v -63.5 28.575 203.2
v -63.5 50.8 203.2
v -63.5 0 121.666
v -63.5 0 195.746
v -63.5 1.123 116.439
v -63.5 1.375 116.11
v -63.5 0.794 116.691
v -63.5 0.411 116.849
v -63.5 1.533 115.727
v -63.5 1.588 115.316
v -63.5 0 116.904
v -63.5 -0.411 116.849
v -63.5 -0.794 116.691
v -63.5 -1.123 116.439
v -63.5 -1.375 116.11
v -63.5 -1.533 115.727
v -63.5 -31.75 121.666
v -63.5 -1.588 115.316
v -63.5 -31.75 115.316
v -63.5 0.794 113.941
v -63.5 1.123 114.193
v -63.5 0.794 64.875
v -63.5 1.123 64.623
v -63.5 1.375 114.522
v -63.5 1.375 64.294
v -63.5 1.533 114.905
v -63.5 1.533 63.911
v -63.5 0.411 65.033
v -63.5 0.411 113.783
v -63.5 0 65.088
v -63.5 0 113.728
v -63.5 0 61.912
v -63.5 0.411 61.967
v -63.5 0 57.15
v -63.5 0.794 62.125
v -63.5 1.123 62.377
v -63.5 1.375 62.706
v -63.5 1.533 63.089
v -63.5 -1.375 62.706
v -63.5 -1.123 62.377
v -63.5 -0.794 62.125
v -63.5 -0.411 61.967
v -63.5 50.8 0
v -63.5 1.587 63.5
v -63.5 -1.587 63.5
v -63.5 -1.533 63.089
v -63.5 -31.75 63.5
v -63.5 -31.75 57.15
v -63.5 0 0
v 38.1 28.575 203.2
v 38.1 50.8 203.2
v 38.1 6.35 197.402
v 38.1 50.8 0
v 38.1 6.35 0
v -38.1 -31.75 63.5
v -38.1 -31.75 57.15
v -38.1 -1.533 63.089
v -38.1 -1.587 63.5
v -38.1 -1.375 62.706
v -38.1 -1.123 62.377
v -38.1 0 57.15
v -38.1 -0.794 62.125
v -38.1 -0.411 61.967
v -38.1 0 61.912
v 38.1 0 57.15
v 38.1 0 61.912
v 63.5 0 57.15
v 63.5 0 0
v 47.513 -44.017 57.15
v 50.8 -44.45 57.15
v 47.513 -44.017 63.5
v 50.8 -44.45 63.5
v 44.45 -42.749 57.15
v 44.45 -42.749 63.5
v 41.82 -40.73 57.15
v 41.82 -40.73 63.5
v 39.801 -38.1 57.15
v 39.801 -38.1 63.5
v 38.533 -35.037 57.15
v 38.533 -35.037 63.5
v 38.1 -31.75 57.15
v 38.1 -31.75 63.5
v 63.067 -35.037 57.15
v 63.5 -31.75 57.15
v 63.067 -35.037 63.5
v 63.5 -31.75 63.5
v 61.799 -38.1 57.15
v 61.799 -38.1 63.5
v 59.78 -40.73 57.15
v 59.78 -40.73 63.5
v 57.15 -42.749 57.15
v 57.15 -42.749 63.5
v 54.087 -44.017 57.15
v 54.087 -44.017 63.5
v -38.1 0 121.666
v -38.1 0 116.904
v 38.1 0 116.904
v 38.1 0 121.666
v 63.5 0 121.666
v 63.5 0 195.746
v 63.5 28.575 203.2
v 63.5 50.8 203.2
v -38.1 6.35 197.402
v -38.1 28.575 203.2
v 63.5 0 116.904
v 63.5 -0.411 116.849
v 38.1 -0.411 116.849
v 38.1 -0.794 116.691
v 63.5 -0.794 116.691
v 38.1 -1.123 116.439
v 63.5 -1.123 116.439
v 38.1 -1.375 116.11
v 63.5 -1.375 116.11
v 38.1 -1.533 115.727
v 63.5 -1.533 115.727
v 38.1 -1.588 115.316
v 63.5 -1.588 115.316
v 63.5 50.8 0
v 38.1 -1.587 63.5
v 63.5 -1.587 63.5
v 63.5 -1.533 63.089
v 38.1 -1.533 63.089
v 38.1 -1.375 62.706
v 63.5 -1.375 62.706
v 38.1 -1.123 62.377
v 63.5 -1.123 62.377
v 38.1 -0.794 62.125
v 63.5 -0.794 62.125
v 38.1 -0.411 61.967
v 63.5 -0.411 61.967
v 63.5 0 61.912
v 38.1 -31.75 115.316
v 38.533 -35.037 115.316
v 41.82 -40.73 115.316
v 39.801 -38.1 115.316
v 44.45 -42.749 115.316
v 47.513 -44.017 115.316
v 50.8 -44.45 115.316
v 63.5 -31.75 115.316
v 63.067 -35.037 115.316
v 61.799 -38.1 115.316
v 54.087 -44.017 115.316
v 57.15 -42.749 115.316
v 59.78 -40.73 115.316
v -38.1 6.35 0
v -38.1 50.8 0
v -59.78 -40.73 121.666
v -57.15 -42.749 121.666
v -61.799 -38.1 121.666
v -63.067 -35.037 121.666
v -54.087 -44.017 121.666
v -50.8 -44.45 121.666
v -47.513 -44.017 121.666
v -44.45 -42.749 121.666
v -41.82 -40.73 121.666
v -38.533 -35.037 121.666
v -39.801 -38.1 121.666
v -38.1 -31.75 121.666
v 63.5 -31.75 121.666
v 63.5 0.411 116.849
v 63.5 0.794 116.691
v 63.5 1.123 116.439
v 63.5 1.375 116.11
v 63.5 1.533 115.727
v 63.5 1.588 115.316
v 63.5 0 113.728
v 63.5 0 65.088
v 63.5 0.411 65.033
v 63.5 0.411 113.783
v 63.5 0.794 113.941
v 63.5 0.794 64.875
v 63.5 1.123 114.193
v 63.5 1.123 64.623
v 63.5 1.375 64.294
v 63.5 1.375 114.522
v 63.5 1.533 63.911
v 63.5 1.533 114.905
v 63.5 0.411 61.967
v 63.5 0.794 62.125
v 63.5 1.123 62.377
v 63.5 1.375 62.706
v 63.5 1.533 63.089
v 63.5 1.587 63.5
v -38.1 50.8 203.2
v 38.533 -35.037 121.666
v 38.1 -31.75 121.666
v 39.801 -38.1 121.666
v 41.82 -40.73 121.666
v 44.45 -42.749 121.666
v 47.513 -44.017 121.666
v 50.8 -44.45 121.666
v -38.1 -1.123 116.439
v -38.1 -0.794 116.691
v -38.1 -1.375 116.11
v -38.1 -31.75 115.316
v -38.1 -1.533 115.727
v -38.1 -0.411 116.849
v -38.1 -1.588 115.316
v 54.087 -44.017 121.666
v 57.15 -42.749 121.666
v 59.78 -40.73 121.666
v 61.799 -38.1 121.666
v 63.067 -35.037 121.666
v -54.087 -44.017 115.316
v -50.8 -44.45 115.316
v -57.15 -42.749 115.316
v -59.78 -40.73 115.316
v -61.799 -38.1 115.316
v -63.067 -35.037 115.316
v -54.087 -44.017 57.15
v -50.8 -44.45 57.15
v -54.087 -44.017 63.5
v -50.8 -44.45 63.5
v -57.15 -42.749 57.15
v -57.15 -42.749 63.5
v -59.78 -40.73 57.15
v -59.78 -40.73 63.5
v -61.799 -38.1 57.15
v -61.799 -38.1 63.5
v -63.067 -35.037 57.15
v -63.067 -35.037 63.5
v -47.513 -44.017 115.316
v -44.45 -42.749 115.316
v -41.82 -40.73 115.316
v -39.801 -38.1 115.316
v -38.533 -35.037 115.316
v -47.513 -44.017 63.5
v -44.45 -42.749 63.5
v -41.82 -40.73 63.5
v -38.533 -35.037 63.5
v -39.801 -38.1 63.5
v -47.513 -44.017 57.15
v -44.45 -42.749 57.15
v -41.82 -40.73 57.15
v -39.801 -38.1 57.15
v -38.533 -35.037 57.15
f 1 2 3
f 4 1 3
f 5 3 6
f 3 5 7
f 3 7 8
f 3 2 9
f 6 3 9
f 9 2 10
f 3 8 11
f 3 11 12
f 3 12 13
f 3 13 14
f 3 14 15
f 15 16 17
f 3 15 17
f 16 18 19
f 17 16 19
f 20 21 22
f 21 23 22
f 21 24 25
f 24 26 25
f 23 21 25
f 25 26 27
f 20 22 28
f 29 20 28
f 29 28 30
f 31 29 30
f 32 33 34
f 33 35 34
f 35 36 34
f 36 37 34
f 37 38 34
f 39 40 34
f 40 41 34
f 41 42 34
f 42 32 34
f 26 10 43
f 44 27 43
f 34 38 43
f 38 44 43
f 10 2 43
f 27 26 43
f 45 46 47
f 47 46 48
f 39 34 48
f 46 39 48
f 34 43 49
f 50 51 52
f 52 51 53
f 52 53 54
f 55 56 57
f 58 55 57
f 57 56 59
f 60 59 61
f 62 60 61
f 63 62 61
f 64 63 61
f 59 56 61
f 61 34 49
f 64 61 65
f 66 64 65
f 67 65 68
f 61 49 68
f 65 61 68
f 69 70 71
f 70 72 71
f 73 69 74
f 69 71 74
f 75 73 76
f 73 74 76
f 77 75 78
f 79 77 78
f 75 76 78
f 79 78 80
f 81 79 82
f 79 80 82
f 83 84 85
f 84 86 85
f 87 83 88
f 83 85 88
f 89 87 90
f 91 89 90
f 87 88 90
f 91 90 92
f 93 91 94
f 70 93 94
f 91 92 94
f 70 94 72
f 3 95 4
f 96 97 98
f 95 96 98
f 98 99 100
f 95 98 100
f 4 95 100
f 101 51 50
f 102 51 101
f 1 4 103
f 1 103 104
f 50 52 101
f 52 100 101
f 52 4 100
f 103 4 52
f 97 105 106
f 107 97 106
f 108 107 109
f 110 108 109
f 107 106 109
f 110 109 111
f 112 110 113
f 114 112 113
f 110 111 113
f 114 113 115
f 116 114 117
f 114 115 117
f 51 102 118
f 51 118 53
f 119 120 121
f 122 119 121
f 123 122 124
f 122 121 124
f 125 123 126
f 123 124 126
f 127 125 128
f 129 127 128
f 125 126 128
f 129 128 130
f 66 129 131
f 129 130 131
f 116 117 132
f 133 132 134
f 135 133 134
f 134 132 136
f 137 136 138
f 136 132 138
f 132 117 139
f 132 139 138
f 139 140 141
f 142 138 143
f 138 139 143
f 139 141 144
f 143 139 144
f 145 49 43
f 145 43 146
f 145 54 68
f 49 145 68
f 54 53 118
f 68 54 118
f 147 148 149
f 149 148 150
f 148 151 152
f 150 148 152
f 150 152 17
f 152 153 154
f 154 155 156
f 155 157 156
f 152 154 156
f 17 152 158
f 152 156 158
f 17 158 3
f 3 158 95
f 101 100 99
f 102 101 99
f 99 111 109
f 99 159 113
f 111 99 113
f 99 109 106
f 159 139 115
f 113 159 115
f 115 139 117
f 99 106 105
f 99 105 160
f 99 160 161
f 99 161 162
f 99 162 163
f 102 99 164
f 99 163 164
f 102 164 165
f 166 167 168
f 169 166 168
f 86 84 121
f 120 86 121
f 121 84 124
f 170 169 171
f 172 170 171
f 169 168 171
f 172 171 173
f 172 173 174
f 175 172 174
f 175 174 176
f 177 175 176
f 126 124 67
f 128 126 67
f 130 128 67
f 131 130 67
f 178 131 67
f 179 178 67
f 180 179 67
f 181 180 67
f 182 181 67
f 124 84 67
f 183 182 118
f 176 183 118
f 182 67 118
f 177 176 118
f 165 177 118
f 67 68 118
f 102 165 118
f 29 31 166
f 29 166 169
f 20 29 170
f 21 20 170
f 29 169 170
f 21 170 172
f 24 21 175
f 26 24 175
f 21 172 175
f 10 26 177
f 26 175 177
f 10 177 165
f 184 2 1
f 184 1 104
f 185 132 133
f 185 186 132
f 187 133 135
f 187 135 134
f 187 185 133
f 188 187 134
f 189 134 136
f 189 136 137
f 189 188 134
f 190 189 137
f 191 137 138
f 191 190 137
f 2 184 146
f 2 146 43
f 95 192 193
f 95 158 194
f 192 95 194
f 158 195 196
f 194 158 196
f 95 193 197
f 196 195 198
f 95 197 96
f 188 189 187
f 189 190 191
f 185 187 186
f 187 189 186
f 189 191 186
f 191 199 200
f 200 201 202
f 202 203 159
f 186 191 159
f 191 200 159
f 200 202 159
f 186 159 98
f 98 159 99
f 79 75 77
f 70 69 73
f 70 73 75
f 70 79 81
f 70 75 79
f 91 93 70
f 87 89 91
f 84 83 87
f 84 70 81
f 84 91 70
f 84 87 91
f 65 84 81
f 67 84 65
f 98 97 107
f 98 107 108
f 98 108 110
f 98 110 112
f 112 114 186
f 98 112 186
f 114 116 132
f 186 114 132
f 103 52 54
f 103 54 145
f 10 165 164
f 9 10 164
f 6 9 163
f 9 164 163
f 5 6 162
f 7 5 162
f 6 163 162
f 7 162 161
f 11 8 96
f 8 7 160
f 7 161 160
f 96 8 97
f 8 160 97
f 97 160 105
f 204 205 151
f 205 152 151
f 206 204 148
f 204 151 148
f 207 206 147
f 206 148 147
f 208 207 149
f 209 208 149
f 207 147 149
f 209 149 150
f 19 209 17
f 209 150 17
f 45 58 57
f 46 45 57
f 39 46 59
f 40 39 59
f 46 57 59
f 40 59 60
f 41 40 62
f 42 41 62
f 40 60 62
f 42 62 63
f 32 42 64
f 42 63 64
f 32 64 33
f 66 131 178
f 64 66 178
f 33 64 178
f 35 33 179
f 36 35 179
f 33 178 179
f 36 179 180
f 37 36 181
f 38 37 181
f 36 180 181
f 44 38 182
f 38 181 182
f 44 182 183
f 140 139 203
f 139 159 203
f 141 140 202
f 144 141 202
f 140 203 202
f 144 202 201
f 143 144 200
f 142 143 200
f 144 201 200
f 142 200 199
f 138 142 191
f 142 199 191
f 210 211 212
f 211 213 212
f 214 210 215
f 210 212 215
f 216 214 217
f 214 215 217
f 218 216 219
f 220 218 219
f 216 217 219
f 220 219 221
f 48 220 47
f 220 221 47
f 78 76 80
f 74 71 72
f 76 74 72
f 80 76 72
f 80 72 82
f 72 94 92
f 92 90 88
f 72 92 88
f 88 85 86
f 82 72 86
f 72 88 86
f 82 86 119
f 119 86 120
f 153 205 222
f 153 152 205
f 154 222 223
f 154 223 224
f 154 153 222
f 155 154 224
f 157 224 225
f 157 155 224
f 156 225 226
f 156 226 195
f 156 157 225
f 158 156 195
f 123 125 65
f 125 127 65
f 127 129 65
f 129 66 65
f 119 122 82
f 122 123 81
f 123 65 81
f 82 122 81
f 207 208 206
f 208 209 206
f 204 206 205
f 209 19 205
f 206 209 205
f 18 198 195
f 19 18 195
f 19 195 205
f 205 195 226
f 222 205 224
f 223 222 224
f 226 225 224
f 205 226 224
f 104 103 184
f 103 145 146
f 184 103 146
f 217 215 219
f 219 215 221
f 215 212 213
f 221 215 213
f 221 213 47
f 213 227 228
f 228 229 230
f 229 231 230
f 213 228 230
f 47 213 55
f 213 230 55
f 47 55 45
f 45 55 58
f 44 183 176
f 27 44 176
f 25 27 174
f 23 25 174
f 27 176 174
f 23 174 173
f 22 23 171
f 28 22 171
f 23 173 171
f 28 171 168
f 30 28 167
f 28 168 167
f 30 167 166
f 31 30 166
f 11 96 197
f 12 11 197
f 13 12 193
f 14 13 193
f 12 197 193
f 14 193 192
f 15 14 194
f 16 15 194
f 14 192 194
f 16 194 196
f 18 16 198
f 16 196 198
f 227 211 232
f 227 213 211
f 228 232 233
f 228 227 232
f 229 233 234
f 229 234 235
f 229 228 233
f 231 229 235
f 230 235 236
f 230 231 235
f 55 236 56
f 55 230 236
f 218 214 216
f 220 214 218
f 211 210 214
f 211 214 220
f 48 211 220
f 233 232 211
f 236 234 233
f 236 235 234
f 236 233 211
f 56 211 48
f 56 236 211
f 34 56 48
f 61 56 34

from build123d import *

# Parameters (mm, degrees)
F1_DEPTH = 203.2
F2_W     = 44.45
F2_H     = 57.15
F3_DEPTH = 127.001
F4_R     = 12.69999


# Not quite as in the source:
# - a fillet or chamfer is up to 0.001 mm smaller than in the source, because OpenCascade refuses the exact size
# - a feature of the source that left no trace in its solid (it failed there, or was rolled back) is left out


with BuildPart() as f1:
    # F0 (on Top) → F1 (new body)
    with BuildSketch(Plane.XY):
        Polygon((-38.1, 0), (0, 0), (38.1, 0), (38.1, -44.45), (63.5, -44.45), (63.5, 50.8), (38.1, 50.8), (38.1, 6.35), (0, 6.35), (-38.1, 6.35), (-38.1, 50.8), (-63.5, 50.8), (-63.5, -44.45), (-38.1, -44.45), align=None)
    extrude(amount=F1_DEPTH)

    # F2 (on face) → F3 (cut, through all)
    with BuildSketch(Plane.YZ.offset(63.5)):
        with BuildLine():
            Line((-44.45, 115.316), (-44.45, 63.5))
            Line((-44.45, 63.5), (-1.5875, 63.5))
            ThreePointArc((-1.5875, 63.5), (-1.1225320151, 64.6225320151), (0, 65.0875))
            Line((0, 65.0875), (0, 113.7285))
            ThreePointArc((0, 113.7285), (-1.1225320151, 114.1934679849), (-1.5875, 115.316))
            Line((-1.5875, 115.316), (-44.45, 115.316))
        make_face()
        with BuildLine():
            ThreePointArc((0, 65.0875), (-1.1225320151, 64.6225320151), (-1.5875, 63.5))
            Line((-1.5875, 63.5), (0, 63.5))
            Line((0, 63.5), (0, 65.0875))
        make_face()
        with Locations((-22.225, 28.575)):
            Rectangle(F2_W, F2_H)
        Polygon((-44.45, 203.2), (-44.45, 184.15), (0, 195.7456521739), (0, 203.2), align=None)
        with BuildLine():
            Line((0, 115.316), (0, 113.7285))
            ThreePointArc((0, 113.7285), (1.1225320151, 114.1934679849), (1.5875, 115.316))
            ThreePointArc((1.5875, 115.316), (1.1225320151, 116.4385320151), (0, 116.9035))
            Line((0, 116.9035), (0, 115.316))
        make_face()
        with BuildLine():
            ThreePointArc((0, 116.9035), (-1.1225320151, 116.4385320151), (-1.5875, 115.316))
            Line((-1.5875, 115.316), (0, 115.316))
            Line((0, 115.316), (0, 116.9035))
        make_face()
        with BuildLine():
            Line((0, 115.316), (-1.5875, 115.316))
            ThreePointArc((-1.5875, 115.316), (-1.1225320151, 114.1934679849), (0, 113.7285))
            Line((0, 113.7285), (0, 115.316))
        make_face()
        with BuildLine():
            Line((0, 65.0875), (0, 63.5))
            Line((0, 63.5), (0, 61.9125))
            ThreePointArc((0, 61.9125), (1.1225320151, 62.3774679849), (1.5875, 63.5))
            ThreePointArc((1.5875, 63.5), (1.1225320151, 64.6225320151), (0, 65.0875))
        make_face()
        with BuildLine():
            Line((0, 63.5), (-1.5875, 63.5))
            ThreePointArc((-1.5875, 63.5), (-1.1225320151, 62.3774679849), (0, 61.9125))
            Line((0, 61.9125), (0, 63.5))
        make_face()
        Polygon((0, 203.2), (0, 195.7456521739), (28.575, 203.2), align=None)
        Polygon((-44.45, 184.15), (-44.45, 121.666), (0, 121.666), (0, 195.7456521739), align=None)
    extrude(amount=-F3_DEPTH, mode=Mode.SUBTRACT)

    # F4 (radius 12.7 in the source; OpenCascade refuses exactly that, so slightly less here)
    f4_edges = [f1.edges().sort_by_distance(p)[0] for p in [
        (38.1, -44.45, 118.491),
        (63.5, -44.45, 118.491),
        (-63.5, -44.45, 118.491),
        (-38.1, -44.45, 118.491),
        (-38.1, -44.45, 60.325),
        (-63.5, -44.45, 60.325),
        (38.1, -44.45, 60.325),
        (63.5, -44.45, 60.325),
    ]]
    fillet(f4_edges, radius=F4_R)


solid = f1.part
